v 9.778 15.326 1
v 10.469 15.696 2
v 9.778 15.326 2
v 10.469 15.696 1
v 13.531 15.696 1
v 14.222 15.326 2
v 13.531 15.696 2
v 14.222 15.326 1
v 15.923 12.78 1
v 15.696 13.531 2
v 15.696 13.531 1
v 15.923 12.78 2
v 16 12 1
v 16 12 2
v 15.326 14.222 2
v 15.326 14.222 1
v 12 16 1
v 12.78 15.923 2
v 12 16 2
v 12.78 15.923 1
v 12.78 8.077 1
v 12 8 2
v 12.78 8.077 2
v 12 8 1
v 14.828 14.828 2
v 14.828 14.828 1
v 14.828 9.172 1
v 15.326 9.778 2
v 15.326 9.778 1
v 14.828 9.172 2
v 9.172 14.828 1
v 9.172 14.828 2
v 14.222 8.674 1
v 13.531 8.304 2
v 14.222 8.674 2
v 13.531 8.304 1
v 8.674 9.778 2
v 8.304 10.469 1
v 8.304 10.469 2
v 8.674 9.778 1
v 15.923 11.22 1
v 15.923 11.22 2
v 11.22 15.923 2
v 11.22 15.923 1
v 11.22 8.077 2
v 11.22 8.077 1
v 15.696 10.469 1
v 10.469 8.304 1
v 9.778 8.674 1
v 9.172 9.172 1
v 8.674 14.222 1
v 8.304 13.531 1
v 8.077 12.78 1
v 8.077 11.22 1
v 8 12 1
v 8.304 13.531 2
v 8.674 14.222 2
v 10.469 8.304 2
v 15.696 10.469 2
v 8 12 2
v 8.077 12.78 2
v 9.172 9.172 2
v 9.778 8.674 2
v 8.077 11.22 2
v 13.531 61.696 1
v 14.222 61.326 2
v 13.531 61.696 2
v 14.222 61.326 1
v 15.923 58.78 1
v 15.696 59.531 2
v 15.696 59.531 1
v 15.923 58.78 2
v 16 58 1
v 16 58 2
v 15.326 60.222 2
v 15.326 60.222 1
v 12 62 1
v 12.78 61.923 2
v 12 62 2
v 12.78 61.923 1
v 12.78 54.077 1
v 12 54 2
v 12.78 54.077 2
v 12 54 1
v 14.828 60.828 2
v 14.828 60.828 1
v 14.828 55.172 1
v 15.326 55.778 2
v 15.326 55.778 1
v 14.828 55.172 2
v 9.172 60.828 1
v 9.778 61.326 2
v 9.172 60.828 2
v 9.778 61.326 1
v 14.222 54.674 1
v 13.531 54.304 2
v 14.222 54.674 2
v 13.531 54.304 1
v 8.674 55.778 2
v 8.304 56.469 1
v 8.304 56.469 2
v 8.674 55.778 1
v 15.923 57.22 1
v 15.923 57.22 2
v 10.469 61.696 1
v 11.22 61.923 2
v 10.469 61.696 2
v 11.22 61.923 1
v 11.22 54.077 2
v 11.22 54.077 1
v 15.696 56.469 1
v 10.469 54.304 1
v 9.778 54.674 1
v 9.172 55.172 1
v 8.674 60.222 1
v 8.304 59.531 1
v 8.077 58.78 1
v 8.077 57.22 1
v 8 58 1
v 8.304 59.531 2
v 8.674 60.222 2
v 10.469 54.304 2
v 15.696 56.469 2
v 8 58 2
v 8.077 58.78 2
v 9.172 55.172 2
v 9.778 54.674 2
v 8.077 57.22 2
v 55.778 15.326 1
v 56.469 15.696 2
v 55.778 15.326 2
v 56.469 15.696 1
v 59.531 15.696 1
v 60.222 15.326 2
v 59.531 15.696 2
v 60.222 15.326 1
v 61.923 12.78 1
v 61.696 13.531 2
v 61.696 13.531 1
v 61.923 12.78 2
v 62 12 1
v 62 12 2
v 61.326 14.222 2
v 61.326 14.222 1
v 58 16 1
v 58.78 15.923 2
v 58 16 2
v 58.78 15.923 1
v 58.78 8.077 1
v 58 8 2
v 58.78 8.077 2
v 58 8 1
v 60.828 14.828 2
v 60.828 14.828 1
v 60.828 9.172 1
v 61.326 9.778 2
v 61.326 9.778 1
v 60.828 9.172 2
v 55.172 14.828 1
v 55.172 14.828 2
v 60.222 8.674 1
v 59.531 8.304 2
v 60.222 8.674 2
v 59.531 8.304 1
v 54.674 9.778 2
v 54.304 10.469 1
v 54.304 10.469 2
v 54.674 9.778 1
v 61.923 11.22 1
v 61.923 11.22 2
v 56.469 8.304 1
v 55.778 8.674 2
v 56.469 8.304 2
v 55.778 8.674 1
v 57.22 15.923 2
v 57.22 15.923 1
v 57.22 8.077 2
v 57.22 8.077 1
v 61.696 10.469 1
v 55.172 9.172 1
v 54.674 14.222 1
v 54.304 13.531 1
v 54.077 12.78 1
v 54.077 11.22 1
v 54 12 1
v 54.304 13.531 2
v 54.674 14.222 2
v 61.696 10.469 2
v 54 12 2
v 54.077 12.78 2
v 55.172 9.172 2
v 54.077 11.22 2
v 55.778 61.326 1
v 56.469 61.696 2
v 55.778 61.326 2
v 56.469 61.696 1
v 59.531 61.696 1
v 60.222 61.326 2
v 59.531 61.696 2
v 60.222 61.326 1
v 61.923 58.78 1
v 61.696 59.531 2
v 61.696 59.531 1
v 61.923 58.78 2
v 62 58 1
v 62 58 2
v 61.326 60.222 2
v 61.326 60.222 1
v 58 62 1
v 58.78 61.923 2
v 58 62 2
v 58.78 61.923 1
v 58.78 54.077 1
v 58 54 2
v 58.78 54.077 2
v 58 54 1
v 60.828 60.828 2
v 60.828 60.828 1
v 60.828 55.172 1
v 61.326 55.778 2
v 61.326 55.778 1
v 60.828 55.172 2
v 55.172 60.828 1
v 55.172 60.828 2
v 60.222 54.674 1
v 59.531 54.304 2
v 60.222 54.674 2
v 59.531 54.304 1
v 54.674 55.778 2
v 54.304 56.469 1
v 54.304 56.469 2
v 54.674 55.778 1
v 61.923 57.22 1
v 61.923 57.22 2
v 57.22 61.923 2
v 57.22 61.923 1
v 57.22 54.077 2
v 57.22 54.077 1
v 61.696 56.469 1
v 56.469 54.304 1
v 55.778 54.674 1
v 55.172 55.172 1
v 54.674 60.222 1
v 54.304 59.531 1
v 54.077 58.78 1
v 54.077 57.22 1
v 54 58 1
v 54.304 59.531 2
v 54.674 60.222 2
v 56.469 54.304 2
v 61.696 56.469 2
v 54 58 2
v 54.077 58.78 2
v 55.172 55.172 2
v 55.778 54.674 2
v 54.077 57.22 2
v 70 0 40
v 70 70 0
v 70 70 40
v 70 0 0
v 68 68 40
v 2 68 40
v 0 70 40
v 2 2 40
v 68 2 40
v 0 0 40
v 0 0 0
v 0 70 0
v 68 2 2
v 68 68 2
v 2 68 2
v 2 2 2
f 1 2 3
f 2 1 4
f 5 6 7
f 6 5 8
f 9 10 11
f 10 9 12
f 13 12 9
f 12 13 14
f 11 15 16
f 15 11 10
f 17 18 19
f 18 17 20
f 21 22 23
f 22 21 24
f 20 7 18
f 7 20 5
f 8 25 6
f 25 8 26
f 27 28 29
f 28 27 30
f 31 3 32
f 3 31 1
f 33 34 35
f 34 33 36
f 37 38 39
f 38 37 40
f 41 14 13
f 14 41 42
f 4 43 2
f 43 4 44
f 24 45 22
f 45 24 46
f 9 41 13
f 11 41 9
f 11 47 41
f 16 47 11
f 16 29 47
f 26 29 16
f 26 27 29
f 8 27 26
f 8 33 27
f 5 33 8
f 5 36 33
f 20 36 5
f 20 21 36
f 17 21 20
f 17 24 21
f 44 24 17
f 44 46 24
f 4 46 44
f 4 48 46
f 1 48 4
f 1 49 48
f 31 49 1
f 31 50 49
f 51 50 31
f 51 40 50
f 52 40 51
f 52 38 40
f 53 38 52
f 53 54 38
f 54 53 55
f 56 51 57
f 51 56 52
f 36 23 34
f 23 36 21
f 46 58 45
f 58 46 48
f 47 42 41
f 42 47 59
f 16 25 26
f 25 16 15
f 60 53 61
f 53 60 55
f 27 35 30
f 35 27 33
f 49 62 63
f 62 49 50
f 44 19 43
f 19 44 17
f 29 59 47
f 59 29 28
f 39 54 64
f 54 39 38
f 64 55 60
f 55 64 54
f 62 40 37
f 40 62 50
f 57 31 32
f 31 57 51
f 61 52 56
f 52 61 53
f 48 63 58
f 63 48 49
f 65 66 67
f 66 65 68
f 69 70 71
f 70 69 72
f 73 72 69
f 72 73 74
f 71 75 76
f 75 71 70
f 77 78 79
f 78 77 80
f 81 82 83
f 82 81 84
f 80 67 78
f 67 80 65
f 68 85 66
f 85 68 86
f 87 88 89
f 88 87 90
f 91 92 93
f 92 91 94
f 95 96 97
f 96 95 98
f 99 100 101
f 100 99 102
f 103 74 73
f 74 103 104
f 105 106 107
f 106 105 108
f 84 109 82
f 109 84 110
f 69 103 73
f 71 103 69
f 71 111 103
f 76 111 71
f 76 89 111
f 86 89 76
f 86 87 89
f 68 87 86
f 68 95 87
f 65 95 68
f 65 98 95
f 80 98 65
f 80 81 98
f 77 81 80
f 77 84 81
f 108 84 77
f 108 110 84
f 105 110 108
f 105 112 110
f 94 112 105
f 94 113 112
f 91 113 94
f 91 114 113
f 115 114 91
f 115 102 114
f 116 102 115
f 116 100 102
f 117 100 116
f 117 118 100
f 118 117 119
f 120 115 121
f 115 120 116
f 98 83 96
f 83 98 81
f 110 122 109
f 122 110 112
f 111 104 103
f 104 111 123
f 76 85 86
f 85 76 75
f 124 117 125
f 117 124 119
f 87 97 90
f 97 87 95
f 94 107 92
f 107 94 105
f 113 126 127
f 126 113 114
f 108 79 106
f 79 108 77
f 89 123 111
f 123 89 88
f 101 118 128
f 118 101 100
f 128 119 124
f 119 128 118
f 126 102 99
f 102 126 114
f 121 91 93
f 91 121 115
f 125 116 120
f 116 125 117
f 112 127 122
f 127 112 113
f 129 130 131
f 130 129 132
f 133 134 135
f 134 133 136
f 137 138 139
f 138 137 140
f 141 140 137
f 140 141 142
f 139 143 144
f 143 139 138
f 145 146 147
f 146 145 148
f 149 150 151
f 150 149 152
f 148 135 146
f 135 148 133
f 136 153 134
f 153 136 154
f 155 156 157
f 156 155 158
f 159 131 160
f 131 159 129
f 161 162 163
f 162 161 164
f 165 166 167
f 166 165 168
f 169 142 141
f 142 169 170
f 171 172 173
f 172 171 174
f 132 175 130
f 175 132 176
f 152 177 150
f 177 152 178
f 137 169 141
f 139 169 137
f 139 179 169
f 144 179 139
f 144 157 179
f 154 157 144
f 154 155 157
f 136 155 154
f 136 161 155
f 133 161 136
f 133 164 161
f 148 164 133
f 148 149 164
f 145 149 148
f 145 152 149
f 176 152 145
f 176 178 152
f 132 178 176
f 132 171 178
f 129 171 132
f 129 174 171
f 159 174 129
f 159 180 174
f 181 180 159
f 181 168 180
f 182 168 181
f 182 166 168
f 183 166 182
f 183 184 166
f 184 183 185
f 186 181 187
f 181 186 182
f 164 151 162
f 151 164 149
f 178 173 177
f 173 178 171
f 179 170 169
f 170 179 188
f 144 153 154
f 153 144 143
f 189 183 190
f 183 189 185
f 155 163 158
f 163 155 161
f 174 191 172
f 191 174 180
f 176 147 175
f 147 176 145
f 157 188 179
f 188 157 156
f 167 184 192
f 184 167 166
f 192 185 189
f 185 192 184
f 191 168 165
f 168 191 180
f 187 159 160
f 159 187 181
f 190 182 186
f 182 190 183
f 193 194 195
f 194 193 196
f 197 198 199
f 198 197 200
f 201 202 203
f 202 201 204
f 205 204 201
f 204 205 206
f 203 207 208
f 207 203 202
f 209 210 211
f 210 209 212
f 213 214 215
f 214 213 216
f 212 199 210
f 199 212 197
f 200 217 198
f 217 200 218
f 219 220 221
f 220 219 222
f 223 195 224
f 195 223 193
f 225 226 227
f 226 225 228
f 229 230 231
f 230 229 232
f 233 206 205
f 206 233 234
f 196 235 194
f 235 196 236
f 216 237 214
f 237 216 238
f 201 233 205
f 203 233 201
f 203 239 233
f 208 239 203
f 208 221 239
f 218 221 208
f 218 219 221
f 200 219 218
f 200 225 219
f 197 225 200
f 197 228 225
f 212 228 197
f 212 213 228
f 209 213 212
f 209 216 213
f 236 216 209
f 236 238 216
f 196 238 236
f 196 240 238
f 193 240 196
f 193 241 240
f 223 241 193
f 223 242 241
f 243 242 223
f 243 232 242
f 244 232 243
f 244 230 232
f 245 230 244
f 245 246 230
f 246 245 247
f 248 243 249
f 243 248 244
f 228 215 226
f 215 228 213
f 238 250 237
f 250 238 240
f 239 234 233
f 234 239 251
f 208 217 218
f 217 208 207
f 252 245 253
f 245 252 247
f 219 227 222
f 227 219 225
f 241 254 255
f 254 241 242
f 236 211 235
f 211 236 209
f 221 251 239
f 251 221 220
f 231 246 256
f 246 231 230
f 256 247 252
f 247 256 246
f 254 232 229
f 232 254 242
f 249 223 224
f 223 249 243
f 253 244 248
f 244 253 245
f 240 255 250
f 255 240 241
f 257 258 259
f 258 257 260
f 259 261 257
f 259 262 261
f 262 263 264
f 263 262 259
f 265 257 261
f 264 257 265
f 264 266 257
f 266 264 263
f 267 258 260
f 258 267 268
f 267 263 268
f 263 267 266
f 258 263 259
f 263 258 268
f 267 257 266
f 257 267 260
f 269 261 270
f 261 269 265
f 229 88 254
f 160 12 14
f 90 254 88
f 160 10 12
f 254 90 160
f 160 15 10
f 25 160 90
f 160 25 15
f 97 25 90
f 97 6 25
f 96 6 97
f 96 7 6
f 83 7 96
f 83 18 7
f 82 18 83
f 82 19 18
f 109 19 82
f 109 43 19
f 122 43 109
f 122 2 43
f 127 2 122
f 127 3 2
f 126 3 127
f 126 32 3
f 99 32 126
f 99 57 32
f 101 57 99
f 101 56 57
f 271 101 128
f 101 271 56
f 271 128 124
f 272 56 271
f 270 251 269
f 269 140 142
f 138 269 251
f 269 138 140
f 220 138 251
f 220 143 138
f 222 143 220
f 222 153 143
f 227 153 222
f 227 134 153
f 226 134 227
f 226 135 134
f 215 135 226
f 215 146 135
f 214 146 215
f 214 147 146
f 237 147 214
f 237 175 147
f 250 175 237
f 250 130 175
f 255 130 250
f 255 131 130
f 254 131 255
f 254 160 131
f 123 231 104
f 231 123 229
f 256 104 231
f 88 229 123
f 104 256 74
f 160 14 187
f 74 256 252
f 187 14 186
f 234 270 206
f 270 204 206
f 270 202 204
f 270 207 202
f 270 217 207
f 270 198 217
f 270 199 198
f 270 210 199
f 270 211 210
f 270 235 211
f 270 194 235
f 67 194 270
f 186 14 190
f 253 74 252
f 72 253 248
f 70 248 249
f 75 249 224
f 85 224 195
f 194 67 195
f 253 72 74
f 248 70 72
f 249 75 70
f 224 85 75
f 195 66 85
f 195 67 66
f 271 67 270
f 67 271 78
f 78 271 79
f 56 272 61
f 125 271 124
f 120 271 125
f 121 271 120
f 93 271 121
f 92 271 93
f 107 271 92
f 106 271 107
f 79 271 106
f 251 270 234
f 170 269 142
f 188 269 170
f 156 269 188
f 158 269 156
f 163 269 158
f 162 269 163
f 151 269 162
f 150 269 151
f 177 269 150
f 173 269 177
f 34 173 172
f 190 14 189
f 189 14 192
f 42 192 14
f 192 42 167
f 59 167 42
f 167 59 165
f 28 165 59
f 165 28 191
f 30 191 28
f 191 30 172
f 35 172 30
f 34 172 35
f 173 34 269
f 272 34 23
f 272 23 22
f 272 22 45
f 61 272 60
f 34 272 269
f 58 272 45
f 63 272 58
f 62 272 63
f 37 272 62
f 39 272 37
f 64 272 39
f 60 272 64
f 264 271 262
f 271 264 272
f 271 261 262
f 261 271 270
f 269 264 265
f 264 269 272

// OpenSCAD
$fn = 32;

// ----------------------------------------------------------------------
// Enclosure box: bosses enclosure
// ----------------------------------------------------------------------

// --- parameters (mm) ---
box_l = 70;               // outer length, X
box_w = 70;               // outer width, Y
box_h = 40;               // outer height
wall_t = 2;               // wall thickness
boss_r = 4;               // corner boss radius
hole_r = 2;               // boss screw hole radius
boss_in = 12;             // boss inset from the corners

inner_h = box_h - wall_t;  // cavity depth
boss_h = inner_h - 2;  // corner boss height

difference() {
  cube([box_l, box_w, box_h]);
  translate([wall_t, wall_t, wall_t])
    cube([box_l - 2 * wall_t, box_w - 2 * wall_t, box_h]);
  for (sx = [0, 1], sy = [0, 1])
    translate([sx ? box_l - boss_in : boss_in,
               sy ? box_w - boss_in : boss_in, wall_t - 1]) {
      cylinder(r = boss_r, h = boss_h);
      translate([0, 0, boss_h - 4])
        cylinder(r = hole_r, h = 5);
    }
}
